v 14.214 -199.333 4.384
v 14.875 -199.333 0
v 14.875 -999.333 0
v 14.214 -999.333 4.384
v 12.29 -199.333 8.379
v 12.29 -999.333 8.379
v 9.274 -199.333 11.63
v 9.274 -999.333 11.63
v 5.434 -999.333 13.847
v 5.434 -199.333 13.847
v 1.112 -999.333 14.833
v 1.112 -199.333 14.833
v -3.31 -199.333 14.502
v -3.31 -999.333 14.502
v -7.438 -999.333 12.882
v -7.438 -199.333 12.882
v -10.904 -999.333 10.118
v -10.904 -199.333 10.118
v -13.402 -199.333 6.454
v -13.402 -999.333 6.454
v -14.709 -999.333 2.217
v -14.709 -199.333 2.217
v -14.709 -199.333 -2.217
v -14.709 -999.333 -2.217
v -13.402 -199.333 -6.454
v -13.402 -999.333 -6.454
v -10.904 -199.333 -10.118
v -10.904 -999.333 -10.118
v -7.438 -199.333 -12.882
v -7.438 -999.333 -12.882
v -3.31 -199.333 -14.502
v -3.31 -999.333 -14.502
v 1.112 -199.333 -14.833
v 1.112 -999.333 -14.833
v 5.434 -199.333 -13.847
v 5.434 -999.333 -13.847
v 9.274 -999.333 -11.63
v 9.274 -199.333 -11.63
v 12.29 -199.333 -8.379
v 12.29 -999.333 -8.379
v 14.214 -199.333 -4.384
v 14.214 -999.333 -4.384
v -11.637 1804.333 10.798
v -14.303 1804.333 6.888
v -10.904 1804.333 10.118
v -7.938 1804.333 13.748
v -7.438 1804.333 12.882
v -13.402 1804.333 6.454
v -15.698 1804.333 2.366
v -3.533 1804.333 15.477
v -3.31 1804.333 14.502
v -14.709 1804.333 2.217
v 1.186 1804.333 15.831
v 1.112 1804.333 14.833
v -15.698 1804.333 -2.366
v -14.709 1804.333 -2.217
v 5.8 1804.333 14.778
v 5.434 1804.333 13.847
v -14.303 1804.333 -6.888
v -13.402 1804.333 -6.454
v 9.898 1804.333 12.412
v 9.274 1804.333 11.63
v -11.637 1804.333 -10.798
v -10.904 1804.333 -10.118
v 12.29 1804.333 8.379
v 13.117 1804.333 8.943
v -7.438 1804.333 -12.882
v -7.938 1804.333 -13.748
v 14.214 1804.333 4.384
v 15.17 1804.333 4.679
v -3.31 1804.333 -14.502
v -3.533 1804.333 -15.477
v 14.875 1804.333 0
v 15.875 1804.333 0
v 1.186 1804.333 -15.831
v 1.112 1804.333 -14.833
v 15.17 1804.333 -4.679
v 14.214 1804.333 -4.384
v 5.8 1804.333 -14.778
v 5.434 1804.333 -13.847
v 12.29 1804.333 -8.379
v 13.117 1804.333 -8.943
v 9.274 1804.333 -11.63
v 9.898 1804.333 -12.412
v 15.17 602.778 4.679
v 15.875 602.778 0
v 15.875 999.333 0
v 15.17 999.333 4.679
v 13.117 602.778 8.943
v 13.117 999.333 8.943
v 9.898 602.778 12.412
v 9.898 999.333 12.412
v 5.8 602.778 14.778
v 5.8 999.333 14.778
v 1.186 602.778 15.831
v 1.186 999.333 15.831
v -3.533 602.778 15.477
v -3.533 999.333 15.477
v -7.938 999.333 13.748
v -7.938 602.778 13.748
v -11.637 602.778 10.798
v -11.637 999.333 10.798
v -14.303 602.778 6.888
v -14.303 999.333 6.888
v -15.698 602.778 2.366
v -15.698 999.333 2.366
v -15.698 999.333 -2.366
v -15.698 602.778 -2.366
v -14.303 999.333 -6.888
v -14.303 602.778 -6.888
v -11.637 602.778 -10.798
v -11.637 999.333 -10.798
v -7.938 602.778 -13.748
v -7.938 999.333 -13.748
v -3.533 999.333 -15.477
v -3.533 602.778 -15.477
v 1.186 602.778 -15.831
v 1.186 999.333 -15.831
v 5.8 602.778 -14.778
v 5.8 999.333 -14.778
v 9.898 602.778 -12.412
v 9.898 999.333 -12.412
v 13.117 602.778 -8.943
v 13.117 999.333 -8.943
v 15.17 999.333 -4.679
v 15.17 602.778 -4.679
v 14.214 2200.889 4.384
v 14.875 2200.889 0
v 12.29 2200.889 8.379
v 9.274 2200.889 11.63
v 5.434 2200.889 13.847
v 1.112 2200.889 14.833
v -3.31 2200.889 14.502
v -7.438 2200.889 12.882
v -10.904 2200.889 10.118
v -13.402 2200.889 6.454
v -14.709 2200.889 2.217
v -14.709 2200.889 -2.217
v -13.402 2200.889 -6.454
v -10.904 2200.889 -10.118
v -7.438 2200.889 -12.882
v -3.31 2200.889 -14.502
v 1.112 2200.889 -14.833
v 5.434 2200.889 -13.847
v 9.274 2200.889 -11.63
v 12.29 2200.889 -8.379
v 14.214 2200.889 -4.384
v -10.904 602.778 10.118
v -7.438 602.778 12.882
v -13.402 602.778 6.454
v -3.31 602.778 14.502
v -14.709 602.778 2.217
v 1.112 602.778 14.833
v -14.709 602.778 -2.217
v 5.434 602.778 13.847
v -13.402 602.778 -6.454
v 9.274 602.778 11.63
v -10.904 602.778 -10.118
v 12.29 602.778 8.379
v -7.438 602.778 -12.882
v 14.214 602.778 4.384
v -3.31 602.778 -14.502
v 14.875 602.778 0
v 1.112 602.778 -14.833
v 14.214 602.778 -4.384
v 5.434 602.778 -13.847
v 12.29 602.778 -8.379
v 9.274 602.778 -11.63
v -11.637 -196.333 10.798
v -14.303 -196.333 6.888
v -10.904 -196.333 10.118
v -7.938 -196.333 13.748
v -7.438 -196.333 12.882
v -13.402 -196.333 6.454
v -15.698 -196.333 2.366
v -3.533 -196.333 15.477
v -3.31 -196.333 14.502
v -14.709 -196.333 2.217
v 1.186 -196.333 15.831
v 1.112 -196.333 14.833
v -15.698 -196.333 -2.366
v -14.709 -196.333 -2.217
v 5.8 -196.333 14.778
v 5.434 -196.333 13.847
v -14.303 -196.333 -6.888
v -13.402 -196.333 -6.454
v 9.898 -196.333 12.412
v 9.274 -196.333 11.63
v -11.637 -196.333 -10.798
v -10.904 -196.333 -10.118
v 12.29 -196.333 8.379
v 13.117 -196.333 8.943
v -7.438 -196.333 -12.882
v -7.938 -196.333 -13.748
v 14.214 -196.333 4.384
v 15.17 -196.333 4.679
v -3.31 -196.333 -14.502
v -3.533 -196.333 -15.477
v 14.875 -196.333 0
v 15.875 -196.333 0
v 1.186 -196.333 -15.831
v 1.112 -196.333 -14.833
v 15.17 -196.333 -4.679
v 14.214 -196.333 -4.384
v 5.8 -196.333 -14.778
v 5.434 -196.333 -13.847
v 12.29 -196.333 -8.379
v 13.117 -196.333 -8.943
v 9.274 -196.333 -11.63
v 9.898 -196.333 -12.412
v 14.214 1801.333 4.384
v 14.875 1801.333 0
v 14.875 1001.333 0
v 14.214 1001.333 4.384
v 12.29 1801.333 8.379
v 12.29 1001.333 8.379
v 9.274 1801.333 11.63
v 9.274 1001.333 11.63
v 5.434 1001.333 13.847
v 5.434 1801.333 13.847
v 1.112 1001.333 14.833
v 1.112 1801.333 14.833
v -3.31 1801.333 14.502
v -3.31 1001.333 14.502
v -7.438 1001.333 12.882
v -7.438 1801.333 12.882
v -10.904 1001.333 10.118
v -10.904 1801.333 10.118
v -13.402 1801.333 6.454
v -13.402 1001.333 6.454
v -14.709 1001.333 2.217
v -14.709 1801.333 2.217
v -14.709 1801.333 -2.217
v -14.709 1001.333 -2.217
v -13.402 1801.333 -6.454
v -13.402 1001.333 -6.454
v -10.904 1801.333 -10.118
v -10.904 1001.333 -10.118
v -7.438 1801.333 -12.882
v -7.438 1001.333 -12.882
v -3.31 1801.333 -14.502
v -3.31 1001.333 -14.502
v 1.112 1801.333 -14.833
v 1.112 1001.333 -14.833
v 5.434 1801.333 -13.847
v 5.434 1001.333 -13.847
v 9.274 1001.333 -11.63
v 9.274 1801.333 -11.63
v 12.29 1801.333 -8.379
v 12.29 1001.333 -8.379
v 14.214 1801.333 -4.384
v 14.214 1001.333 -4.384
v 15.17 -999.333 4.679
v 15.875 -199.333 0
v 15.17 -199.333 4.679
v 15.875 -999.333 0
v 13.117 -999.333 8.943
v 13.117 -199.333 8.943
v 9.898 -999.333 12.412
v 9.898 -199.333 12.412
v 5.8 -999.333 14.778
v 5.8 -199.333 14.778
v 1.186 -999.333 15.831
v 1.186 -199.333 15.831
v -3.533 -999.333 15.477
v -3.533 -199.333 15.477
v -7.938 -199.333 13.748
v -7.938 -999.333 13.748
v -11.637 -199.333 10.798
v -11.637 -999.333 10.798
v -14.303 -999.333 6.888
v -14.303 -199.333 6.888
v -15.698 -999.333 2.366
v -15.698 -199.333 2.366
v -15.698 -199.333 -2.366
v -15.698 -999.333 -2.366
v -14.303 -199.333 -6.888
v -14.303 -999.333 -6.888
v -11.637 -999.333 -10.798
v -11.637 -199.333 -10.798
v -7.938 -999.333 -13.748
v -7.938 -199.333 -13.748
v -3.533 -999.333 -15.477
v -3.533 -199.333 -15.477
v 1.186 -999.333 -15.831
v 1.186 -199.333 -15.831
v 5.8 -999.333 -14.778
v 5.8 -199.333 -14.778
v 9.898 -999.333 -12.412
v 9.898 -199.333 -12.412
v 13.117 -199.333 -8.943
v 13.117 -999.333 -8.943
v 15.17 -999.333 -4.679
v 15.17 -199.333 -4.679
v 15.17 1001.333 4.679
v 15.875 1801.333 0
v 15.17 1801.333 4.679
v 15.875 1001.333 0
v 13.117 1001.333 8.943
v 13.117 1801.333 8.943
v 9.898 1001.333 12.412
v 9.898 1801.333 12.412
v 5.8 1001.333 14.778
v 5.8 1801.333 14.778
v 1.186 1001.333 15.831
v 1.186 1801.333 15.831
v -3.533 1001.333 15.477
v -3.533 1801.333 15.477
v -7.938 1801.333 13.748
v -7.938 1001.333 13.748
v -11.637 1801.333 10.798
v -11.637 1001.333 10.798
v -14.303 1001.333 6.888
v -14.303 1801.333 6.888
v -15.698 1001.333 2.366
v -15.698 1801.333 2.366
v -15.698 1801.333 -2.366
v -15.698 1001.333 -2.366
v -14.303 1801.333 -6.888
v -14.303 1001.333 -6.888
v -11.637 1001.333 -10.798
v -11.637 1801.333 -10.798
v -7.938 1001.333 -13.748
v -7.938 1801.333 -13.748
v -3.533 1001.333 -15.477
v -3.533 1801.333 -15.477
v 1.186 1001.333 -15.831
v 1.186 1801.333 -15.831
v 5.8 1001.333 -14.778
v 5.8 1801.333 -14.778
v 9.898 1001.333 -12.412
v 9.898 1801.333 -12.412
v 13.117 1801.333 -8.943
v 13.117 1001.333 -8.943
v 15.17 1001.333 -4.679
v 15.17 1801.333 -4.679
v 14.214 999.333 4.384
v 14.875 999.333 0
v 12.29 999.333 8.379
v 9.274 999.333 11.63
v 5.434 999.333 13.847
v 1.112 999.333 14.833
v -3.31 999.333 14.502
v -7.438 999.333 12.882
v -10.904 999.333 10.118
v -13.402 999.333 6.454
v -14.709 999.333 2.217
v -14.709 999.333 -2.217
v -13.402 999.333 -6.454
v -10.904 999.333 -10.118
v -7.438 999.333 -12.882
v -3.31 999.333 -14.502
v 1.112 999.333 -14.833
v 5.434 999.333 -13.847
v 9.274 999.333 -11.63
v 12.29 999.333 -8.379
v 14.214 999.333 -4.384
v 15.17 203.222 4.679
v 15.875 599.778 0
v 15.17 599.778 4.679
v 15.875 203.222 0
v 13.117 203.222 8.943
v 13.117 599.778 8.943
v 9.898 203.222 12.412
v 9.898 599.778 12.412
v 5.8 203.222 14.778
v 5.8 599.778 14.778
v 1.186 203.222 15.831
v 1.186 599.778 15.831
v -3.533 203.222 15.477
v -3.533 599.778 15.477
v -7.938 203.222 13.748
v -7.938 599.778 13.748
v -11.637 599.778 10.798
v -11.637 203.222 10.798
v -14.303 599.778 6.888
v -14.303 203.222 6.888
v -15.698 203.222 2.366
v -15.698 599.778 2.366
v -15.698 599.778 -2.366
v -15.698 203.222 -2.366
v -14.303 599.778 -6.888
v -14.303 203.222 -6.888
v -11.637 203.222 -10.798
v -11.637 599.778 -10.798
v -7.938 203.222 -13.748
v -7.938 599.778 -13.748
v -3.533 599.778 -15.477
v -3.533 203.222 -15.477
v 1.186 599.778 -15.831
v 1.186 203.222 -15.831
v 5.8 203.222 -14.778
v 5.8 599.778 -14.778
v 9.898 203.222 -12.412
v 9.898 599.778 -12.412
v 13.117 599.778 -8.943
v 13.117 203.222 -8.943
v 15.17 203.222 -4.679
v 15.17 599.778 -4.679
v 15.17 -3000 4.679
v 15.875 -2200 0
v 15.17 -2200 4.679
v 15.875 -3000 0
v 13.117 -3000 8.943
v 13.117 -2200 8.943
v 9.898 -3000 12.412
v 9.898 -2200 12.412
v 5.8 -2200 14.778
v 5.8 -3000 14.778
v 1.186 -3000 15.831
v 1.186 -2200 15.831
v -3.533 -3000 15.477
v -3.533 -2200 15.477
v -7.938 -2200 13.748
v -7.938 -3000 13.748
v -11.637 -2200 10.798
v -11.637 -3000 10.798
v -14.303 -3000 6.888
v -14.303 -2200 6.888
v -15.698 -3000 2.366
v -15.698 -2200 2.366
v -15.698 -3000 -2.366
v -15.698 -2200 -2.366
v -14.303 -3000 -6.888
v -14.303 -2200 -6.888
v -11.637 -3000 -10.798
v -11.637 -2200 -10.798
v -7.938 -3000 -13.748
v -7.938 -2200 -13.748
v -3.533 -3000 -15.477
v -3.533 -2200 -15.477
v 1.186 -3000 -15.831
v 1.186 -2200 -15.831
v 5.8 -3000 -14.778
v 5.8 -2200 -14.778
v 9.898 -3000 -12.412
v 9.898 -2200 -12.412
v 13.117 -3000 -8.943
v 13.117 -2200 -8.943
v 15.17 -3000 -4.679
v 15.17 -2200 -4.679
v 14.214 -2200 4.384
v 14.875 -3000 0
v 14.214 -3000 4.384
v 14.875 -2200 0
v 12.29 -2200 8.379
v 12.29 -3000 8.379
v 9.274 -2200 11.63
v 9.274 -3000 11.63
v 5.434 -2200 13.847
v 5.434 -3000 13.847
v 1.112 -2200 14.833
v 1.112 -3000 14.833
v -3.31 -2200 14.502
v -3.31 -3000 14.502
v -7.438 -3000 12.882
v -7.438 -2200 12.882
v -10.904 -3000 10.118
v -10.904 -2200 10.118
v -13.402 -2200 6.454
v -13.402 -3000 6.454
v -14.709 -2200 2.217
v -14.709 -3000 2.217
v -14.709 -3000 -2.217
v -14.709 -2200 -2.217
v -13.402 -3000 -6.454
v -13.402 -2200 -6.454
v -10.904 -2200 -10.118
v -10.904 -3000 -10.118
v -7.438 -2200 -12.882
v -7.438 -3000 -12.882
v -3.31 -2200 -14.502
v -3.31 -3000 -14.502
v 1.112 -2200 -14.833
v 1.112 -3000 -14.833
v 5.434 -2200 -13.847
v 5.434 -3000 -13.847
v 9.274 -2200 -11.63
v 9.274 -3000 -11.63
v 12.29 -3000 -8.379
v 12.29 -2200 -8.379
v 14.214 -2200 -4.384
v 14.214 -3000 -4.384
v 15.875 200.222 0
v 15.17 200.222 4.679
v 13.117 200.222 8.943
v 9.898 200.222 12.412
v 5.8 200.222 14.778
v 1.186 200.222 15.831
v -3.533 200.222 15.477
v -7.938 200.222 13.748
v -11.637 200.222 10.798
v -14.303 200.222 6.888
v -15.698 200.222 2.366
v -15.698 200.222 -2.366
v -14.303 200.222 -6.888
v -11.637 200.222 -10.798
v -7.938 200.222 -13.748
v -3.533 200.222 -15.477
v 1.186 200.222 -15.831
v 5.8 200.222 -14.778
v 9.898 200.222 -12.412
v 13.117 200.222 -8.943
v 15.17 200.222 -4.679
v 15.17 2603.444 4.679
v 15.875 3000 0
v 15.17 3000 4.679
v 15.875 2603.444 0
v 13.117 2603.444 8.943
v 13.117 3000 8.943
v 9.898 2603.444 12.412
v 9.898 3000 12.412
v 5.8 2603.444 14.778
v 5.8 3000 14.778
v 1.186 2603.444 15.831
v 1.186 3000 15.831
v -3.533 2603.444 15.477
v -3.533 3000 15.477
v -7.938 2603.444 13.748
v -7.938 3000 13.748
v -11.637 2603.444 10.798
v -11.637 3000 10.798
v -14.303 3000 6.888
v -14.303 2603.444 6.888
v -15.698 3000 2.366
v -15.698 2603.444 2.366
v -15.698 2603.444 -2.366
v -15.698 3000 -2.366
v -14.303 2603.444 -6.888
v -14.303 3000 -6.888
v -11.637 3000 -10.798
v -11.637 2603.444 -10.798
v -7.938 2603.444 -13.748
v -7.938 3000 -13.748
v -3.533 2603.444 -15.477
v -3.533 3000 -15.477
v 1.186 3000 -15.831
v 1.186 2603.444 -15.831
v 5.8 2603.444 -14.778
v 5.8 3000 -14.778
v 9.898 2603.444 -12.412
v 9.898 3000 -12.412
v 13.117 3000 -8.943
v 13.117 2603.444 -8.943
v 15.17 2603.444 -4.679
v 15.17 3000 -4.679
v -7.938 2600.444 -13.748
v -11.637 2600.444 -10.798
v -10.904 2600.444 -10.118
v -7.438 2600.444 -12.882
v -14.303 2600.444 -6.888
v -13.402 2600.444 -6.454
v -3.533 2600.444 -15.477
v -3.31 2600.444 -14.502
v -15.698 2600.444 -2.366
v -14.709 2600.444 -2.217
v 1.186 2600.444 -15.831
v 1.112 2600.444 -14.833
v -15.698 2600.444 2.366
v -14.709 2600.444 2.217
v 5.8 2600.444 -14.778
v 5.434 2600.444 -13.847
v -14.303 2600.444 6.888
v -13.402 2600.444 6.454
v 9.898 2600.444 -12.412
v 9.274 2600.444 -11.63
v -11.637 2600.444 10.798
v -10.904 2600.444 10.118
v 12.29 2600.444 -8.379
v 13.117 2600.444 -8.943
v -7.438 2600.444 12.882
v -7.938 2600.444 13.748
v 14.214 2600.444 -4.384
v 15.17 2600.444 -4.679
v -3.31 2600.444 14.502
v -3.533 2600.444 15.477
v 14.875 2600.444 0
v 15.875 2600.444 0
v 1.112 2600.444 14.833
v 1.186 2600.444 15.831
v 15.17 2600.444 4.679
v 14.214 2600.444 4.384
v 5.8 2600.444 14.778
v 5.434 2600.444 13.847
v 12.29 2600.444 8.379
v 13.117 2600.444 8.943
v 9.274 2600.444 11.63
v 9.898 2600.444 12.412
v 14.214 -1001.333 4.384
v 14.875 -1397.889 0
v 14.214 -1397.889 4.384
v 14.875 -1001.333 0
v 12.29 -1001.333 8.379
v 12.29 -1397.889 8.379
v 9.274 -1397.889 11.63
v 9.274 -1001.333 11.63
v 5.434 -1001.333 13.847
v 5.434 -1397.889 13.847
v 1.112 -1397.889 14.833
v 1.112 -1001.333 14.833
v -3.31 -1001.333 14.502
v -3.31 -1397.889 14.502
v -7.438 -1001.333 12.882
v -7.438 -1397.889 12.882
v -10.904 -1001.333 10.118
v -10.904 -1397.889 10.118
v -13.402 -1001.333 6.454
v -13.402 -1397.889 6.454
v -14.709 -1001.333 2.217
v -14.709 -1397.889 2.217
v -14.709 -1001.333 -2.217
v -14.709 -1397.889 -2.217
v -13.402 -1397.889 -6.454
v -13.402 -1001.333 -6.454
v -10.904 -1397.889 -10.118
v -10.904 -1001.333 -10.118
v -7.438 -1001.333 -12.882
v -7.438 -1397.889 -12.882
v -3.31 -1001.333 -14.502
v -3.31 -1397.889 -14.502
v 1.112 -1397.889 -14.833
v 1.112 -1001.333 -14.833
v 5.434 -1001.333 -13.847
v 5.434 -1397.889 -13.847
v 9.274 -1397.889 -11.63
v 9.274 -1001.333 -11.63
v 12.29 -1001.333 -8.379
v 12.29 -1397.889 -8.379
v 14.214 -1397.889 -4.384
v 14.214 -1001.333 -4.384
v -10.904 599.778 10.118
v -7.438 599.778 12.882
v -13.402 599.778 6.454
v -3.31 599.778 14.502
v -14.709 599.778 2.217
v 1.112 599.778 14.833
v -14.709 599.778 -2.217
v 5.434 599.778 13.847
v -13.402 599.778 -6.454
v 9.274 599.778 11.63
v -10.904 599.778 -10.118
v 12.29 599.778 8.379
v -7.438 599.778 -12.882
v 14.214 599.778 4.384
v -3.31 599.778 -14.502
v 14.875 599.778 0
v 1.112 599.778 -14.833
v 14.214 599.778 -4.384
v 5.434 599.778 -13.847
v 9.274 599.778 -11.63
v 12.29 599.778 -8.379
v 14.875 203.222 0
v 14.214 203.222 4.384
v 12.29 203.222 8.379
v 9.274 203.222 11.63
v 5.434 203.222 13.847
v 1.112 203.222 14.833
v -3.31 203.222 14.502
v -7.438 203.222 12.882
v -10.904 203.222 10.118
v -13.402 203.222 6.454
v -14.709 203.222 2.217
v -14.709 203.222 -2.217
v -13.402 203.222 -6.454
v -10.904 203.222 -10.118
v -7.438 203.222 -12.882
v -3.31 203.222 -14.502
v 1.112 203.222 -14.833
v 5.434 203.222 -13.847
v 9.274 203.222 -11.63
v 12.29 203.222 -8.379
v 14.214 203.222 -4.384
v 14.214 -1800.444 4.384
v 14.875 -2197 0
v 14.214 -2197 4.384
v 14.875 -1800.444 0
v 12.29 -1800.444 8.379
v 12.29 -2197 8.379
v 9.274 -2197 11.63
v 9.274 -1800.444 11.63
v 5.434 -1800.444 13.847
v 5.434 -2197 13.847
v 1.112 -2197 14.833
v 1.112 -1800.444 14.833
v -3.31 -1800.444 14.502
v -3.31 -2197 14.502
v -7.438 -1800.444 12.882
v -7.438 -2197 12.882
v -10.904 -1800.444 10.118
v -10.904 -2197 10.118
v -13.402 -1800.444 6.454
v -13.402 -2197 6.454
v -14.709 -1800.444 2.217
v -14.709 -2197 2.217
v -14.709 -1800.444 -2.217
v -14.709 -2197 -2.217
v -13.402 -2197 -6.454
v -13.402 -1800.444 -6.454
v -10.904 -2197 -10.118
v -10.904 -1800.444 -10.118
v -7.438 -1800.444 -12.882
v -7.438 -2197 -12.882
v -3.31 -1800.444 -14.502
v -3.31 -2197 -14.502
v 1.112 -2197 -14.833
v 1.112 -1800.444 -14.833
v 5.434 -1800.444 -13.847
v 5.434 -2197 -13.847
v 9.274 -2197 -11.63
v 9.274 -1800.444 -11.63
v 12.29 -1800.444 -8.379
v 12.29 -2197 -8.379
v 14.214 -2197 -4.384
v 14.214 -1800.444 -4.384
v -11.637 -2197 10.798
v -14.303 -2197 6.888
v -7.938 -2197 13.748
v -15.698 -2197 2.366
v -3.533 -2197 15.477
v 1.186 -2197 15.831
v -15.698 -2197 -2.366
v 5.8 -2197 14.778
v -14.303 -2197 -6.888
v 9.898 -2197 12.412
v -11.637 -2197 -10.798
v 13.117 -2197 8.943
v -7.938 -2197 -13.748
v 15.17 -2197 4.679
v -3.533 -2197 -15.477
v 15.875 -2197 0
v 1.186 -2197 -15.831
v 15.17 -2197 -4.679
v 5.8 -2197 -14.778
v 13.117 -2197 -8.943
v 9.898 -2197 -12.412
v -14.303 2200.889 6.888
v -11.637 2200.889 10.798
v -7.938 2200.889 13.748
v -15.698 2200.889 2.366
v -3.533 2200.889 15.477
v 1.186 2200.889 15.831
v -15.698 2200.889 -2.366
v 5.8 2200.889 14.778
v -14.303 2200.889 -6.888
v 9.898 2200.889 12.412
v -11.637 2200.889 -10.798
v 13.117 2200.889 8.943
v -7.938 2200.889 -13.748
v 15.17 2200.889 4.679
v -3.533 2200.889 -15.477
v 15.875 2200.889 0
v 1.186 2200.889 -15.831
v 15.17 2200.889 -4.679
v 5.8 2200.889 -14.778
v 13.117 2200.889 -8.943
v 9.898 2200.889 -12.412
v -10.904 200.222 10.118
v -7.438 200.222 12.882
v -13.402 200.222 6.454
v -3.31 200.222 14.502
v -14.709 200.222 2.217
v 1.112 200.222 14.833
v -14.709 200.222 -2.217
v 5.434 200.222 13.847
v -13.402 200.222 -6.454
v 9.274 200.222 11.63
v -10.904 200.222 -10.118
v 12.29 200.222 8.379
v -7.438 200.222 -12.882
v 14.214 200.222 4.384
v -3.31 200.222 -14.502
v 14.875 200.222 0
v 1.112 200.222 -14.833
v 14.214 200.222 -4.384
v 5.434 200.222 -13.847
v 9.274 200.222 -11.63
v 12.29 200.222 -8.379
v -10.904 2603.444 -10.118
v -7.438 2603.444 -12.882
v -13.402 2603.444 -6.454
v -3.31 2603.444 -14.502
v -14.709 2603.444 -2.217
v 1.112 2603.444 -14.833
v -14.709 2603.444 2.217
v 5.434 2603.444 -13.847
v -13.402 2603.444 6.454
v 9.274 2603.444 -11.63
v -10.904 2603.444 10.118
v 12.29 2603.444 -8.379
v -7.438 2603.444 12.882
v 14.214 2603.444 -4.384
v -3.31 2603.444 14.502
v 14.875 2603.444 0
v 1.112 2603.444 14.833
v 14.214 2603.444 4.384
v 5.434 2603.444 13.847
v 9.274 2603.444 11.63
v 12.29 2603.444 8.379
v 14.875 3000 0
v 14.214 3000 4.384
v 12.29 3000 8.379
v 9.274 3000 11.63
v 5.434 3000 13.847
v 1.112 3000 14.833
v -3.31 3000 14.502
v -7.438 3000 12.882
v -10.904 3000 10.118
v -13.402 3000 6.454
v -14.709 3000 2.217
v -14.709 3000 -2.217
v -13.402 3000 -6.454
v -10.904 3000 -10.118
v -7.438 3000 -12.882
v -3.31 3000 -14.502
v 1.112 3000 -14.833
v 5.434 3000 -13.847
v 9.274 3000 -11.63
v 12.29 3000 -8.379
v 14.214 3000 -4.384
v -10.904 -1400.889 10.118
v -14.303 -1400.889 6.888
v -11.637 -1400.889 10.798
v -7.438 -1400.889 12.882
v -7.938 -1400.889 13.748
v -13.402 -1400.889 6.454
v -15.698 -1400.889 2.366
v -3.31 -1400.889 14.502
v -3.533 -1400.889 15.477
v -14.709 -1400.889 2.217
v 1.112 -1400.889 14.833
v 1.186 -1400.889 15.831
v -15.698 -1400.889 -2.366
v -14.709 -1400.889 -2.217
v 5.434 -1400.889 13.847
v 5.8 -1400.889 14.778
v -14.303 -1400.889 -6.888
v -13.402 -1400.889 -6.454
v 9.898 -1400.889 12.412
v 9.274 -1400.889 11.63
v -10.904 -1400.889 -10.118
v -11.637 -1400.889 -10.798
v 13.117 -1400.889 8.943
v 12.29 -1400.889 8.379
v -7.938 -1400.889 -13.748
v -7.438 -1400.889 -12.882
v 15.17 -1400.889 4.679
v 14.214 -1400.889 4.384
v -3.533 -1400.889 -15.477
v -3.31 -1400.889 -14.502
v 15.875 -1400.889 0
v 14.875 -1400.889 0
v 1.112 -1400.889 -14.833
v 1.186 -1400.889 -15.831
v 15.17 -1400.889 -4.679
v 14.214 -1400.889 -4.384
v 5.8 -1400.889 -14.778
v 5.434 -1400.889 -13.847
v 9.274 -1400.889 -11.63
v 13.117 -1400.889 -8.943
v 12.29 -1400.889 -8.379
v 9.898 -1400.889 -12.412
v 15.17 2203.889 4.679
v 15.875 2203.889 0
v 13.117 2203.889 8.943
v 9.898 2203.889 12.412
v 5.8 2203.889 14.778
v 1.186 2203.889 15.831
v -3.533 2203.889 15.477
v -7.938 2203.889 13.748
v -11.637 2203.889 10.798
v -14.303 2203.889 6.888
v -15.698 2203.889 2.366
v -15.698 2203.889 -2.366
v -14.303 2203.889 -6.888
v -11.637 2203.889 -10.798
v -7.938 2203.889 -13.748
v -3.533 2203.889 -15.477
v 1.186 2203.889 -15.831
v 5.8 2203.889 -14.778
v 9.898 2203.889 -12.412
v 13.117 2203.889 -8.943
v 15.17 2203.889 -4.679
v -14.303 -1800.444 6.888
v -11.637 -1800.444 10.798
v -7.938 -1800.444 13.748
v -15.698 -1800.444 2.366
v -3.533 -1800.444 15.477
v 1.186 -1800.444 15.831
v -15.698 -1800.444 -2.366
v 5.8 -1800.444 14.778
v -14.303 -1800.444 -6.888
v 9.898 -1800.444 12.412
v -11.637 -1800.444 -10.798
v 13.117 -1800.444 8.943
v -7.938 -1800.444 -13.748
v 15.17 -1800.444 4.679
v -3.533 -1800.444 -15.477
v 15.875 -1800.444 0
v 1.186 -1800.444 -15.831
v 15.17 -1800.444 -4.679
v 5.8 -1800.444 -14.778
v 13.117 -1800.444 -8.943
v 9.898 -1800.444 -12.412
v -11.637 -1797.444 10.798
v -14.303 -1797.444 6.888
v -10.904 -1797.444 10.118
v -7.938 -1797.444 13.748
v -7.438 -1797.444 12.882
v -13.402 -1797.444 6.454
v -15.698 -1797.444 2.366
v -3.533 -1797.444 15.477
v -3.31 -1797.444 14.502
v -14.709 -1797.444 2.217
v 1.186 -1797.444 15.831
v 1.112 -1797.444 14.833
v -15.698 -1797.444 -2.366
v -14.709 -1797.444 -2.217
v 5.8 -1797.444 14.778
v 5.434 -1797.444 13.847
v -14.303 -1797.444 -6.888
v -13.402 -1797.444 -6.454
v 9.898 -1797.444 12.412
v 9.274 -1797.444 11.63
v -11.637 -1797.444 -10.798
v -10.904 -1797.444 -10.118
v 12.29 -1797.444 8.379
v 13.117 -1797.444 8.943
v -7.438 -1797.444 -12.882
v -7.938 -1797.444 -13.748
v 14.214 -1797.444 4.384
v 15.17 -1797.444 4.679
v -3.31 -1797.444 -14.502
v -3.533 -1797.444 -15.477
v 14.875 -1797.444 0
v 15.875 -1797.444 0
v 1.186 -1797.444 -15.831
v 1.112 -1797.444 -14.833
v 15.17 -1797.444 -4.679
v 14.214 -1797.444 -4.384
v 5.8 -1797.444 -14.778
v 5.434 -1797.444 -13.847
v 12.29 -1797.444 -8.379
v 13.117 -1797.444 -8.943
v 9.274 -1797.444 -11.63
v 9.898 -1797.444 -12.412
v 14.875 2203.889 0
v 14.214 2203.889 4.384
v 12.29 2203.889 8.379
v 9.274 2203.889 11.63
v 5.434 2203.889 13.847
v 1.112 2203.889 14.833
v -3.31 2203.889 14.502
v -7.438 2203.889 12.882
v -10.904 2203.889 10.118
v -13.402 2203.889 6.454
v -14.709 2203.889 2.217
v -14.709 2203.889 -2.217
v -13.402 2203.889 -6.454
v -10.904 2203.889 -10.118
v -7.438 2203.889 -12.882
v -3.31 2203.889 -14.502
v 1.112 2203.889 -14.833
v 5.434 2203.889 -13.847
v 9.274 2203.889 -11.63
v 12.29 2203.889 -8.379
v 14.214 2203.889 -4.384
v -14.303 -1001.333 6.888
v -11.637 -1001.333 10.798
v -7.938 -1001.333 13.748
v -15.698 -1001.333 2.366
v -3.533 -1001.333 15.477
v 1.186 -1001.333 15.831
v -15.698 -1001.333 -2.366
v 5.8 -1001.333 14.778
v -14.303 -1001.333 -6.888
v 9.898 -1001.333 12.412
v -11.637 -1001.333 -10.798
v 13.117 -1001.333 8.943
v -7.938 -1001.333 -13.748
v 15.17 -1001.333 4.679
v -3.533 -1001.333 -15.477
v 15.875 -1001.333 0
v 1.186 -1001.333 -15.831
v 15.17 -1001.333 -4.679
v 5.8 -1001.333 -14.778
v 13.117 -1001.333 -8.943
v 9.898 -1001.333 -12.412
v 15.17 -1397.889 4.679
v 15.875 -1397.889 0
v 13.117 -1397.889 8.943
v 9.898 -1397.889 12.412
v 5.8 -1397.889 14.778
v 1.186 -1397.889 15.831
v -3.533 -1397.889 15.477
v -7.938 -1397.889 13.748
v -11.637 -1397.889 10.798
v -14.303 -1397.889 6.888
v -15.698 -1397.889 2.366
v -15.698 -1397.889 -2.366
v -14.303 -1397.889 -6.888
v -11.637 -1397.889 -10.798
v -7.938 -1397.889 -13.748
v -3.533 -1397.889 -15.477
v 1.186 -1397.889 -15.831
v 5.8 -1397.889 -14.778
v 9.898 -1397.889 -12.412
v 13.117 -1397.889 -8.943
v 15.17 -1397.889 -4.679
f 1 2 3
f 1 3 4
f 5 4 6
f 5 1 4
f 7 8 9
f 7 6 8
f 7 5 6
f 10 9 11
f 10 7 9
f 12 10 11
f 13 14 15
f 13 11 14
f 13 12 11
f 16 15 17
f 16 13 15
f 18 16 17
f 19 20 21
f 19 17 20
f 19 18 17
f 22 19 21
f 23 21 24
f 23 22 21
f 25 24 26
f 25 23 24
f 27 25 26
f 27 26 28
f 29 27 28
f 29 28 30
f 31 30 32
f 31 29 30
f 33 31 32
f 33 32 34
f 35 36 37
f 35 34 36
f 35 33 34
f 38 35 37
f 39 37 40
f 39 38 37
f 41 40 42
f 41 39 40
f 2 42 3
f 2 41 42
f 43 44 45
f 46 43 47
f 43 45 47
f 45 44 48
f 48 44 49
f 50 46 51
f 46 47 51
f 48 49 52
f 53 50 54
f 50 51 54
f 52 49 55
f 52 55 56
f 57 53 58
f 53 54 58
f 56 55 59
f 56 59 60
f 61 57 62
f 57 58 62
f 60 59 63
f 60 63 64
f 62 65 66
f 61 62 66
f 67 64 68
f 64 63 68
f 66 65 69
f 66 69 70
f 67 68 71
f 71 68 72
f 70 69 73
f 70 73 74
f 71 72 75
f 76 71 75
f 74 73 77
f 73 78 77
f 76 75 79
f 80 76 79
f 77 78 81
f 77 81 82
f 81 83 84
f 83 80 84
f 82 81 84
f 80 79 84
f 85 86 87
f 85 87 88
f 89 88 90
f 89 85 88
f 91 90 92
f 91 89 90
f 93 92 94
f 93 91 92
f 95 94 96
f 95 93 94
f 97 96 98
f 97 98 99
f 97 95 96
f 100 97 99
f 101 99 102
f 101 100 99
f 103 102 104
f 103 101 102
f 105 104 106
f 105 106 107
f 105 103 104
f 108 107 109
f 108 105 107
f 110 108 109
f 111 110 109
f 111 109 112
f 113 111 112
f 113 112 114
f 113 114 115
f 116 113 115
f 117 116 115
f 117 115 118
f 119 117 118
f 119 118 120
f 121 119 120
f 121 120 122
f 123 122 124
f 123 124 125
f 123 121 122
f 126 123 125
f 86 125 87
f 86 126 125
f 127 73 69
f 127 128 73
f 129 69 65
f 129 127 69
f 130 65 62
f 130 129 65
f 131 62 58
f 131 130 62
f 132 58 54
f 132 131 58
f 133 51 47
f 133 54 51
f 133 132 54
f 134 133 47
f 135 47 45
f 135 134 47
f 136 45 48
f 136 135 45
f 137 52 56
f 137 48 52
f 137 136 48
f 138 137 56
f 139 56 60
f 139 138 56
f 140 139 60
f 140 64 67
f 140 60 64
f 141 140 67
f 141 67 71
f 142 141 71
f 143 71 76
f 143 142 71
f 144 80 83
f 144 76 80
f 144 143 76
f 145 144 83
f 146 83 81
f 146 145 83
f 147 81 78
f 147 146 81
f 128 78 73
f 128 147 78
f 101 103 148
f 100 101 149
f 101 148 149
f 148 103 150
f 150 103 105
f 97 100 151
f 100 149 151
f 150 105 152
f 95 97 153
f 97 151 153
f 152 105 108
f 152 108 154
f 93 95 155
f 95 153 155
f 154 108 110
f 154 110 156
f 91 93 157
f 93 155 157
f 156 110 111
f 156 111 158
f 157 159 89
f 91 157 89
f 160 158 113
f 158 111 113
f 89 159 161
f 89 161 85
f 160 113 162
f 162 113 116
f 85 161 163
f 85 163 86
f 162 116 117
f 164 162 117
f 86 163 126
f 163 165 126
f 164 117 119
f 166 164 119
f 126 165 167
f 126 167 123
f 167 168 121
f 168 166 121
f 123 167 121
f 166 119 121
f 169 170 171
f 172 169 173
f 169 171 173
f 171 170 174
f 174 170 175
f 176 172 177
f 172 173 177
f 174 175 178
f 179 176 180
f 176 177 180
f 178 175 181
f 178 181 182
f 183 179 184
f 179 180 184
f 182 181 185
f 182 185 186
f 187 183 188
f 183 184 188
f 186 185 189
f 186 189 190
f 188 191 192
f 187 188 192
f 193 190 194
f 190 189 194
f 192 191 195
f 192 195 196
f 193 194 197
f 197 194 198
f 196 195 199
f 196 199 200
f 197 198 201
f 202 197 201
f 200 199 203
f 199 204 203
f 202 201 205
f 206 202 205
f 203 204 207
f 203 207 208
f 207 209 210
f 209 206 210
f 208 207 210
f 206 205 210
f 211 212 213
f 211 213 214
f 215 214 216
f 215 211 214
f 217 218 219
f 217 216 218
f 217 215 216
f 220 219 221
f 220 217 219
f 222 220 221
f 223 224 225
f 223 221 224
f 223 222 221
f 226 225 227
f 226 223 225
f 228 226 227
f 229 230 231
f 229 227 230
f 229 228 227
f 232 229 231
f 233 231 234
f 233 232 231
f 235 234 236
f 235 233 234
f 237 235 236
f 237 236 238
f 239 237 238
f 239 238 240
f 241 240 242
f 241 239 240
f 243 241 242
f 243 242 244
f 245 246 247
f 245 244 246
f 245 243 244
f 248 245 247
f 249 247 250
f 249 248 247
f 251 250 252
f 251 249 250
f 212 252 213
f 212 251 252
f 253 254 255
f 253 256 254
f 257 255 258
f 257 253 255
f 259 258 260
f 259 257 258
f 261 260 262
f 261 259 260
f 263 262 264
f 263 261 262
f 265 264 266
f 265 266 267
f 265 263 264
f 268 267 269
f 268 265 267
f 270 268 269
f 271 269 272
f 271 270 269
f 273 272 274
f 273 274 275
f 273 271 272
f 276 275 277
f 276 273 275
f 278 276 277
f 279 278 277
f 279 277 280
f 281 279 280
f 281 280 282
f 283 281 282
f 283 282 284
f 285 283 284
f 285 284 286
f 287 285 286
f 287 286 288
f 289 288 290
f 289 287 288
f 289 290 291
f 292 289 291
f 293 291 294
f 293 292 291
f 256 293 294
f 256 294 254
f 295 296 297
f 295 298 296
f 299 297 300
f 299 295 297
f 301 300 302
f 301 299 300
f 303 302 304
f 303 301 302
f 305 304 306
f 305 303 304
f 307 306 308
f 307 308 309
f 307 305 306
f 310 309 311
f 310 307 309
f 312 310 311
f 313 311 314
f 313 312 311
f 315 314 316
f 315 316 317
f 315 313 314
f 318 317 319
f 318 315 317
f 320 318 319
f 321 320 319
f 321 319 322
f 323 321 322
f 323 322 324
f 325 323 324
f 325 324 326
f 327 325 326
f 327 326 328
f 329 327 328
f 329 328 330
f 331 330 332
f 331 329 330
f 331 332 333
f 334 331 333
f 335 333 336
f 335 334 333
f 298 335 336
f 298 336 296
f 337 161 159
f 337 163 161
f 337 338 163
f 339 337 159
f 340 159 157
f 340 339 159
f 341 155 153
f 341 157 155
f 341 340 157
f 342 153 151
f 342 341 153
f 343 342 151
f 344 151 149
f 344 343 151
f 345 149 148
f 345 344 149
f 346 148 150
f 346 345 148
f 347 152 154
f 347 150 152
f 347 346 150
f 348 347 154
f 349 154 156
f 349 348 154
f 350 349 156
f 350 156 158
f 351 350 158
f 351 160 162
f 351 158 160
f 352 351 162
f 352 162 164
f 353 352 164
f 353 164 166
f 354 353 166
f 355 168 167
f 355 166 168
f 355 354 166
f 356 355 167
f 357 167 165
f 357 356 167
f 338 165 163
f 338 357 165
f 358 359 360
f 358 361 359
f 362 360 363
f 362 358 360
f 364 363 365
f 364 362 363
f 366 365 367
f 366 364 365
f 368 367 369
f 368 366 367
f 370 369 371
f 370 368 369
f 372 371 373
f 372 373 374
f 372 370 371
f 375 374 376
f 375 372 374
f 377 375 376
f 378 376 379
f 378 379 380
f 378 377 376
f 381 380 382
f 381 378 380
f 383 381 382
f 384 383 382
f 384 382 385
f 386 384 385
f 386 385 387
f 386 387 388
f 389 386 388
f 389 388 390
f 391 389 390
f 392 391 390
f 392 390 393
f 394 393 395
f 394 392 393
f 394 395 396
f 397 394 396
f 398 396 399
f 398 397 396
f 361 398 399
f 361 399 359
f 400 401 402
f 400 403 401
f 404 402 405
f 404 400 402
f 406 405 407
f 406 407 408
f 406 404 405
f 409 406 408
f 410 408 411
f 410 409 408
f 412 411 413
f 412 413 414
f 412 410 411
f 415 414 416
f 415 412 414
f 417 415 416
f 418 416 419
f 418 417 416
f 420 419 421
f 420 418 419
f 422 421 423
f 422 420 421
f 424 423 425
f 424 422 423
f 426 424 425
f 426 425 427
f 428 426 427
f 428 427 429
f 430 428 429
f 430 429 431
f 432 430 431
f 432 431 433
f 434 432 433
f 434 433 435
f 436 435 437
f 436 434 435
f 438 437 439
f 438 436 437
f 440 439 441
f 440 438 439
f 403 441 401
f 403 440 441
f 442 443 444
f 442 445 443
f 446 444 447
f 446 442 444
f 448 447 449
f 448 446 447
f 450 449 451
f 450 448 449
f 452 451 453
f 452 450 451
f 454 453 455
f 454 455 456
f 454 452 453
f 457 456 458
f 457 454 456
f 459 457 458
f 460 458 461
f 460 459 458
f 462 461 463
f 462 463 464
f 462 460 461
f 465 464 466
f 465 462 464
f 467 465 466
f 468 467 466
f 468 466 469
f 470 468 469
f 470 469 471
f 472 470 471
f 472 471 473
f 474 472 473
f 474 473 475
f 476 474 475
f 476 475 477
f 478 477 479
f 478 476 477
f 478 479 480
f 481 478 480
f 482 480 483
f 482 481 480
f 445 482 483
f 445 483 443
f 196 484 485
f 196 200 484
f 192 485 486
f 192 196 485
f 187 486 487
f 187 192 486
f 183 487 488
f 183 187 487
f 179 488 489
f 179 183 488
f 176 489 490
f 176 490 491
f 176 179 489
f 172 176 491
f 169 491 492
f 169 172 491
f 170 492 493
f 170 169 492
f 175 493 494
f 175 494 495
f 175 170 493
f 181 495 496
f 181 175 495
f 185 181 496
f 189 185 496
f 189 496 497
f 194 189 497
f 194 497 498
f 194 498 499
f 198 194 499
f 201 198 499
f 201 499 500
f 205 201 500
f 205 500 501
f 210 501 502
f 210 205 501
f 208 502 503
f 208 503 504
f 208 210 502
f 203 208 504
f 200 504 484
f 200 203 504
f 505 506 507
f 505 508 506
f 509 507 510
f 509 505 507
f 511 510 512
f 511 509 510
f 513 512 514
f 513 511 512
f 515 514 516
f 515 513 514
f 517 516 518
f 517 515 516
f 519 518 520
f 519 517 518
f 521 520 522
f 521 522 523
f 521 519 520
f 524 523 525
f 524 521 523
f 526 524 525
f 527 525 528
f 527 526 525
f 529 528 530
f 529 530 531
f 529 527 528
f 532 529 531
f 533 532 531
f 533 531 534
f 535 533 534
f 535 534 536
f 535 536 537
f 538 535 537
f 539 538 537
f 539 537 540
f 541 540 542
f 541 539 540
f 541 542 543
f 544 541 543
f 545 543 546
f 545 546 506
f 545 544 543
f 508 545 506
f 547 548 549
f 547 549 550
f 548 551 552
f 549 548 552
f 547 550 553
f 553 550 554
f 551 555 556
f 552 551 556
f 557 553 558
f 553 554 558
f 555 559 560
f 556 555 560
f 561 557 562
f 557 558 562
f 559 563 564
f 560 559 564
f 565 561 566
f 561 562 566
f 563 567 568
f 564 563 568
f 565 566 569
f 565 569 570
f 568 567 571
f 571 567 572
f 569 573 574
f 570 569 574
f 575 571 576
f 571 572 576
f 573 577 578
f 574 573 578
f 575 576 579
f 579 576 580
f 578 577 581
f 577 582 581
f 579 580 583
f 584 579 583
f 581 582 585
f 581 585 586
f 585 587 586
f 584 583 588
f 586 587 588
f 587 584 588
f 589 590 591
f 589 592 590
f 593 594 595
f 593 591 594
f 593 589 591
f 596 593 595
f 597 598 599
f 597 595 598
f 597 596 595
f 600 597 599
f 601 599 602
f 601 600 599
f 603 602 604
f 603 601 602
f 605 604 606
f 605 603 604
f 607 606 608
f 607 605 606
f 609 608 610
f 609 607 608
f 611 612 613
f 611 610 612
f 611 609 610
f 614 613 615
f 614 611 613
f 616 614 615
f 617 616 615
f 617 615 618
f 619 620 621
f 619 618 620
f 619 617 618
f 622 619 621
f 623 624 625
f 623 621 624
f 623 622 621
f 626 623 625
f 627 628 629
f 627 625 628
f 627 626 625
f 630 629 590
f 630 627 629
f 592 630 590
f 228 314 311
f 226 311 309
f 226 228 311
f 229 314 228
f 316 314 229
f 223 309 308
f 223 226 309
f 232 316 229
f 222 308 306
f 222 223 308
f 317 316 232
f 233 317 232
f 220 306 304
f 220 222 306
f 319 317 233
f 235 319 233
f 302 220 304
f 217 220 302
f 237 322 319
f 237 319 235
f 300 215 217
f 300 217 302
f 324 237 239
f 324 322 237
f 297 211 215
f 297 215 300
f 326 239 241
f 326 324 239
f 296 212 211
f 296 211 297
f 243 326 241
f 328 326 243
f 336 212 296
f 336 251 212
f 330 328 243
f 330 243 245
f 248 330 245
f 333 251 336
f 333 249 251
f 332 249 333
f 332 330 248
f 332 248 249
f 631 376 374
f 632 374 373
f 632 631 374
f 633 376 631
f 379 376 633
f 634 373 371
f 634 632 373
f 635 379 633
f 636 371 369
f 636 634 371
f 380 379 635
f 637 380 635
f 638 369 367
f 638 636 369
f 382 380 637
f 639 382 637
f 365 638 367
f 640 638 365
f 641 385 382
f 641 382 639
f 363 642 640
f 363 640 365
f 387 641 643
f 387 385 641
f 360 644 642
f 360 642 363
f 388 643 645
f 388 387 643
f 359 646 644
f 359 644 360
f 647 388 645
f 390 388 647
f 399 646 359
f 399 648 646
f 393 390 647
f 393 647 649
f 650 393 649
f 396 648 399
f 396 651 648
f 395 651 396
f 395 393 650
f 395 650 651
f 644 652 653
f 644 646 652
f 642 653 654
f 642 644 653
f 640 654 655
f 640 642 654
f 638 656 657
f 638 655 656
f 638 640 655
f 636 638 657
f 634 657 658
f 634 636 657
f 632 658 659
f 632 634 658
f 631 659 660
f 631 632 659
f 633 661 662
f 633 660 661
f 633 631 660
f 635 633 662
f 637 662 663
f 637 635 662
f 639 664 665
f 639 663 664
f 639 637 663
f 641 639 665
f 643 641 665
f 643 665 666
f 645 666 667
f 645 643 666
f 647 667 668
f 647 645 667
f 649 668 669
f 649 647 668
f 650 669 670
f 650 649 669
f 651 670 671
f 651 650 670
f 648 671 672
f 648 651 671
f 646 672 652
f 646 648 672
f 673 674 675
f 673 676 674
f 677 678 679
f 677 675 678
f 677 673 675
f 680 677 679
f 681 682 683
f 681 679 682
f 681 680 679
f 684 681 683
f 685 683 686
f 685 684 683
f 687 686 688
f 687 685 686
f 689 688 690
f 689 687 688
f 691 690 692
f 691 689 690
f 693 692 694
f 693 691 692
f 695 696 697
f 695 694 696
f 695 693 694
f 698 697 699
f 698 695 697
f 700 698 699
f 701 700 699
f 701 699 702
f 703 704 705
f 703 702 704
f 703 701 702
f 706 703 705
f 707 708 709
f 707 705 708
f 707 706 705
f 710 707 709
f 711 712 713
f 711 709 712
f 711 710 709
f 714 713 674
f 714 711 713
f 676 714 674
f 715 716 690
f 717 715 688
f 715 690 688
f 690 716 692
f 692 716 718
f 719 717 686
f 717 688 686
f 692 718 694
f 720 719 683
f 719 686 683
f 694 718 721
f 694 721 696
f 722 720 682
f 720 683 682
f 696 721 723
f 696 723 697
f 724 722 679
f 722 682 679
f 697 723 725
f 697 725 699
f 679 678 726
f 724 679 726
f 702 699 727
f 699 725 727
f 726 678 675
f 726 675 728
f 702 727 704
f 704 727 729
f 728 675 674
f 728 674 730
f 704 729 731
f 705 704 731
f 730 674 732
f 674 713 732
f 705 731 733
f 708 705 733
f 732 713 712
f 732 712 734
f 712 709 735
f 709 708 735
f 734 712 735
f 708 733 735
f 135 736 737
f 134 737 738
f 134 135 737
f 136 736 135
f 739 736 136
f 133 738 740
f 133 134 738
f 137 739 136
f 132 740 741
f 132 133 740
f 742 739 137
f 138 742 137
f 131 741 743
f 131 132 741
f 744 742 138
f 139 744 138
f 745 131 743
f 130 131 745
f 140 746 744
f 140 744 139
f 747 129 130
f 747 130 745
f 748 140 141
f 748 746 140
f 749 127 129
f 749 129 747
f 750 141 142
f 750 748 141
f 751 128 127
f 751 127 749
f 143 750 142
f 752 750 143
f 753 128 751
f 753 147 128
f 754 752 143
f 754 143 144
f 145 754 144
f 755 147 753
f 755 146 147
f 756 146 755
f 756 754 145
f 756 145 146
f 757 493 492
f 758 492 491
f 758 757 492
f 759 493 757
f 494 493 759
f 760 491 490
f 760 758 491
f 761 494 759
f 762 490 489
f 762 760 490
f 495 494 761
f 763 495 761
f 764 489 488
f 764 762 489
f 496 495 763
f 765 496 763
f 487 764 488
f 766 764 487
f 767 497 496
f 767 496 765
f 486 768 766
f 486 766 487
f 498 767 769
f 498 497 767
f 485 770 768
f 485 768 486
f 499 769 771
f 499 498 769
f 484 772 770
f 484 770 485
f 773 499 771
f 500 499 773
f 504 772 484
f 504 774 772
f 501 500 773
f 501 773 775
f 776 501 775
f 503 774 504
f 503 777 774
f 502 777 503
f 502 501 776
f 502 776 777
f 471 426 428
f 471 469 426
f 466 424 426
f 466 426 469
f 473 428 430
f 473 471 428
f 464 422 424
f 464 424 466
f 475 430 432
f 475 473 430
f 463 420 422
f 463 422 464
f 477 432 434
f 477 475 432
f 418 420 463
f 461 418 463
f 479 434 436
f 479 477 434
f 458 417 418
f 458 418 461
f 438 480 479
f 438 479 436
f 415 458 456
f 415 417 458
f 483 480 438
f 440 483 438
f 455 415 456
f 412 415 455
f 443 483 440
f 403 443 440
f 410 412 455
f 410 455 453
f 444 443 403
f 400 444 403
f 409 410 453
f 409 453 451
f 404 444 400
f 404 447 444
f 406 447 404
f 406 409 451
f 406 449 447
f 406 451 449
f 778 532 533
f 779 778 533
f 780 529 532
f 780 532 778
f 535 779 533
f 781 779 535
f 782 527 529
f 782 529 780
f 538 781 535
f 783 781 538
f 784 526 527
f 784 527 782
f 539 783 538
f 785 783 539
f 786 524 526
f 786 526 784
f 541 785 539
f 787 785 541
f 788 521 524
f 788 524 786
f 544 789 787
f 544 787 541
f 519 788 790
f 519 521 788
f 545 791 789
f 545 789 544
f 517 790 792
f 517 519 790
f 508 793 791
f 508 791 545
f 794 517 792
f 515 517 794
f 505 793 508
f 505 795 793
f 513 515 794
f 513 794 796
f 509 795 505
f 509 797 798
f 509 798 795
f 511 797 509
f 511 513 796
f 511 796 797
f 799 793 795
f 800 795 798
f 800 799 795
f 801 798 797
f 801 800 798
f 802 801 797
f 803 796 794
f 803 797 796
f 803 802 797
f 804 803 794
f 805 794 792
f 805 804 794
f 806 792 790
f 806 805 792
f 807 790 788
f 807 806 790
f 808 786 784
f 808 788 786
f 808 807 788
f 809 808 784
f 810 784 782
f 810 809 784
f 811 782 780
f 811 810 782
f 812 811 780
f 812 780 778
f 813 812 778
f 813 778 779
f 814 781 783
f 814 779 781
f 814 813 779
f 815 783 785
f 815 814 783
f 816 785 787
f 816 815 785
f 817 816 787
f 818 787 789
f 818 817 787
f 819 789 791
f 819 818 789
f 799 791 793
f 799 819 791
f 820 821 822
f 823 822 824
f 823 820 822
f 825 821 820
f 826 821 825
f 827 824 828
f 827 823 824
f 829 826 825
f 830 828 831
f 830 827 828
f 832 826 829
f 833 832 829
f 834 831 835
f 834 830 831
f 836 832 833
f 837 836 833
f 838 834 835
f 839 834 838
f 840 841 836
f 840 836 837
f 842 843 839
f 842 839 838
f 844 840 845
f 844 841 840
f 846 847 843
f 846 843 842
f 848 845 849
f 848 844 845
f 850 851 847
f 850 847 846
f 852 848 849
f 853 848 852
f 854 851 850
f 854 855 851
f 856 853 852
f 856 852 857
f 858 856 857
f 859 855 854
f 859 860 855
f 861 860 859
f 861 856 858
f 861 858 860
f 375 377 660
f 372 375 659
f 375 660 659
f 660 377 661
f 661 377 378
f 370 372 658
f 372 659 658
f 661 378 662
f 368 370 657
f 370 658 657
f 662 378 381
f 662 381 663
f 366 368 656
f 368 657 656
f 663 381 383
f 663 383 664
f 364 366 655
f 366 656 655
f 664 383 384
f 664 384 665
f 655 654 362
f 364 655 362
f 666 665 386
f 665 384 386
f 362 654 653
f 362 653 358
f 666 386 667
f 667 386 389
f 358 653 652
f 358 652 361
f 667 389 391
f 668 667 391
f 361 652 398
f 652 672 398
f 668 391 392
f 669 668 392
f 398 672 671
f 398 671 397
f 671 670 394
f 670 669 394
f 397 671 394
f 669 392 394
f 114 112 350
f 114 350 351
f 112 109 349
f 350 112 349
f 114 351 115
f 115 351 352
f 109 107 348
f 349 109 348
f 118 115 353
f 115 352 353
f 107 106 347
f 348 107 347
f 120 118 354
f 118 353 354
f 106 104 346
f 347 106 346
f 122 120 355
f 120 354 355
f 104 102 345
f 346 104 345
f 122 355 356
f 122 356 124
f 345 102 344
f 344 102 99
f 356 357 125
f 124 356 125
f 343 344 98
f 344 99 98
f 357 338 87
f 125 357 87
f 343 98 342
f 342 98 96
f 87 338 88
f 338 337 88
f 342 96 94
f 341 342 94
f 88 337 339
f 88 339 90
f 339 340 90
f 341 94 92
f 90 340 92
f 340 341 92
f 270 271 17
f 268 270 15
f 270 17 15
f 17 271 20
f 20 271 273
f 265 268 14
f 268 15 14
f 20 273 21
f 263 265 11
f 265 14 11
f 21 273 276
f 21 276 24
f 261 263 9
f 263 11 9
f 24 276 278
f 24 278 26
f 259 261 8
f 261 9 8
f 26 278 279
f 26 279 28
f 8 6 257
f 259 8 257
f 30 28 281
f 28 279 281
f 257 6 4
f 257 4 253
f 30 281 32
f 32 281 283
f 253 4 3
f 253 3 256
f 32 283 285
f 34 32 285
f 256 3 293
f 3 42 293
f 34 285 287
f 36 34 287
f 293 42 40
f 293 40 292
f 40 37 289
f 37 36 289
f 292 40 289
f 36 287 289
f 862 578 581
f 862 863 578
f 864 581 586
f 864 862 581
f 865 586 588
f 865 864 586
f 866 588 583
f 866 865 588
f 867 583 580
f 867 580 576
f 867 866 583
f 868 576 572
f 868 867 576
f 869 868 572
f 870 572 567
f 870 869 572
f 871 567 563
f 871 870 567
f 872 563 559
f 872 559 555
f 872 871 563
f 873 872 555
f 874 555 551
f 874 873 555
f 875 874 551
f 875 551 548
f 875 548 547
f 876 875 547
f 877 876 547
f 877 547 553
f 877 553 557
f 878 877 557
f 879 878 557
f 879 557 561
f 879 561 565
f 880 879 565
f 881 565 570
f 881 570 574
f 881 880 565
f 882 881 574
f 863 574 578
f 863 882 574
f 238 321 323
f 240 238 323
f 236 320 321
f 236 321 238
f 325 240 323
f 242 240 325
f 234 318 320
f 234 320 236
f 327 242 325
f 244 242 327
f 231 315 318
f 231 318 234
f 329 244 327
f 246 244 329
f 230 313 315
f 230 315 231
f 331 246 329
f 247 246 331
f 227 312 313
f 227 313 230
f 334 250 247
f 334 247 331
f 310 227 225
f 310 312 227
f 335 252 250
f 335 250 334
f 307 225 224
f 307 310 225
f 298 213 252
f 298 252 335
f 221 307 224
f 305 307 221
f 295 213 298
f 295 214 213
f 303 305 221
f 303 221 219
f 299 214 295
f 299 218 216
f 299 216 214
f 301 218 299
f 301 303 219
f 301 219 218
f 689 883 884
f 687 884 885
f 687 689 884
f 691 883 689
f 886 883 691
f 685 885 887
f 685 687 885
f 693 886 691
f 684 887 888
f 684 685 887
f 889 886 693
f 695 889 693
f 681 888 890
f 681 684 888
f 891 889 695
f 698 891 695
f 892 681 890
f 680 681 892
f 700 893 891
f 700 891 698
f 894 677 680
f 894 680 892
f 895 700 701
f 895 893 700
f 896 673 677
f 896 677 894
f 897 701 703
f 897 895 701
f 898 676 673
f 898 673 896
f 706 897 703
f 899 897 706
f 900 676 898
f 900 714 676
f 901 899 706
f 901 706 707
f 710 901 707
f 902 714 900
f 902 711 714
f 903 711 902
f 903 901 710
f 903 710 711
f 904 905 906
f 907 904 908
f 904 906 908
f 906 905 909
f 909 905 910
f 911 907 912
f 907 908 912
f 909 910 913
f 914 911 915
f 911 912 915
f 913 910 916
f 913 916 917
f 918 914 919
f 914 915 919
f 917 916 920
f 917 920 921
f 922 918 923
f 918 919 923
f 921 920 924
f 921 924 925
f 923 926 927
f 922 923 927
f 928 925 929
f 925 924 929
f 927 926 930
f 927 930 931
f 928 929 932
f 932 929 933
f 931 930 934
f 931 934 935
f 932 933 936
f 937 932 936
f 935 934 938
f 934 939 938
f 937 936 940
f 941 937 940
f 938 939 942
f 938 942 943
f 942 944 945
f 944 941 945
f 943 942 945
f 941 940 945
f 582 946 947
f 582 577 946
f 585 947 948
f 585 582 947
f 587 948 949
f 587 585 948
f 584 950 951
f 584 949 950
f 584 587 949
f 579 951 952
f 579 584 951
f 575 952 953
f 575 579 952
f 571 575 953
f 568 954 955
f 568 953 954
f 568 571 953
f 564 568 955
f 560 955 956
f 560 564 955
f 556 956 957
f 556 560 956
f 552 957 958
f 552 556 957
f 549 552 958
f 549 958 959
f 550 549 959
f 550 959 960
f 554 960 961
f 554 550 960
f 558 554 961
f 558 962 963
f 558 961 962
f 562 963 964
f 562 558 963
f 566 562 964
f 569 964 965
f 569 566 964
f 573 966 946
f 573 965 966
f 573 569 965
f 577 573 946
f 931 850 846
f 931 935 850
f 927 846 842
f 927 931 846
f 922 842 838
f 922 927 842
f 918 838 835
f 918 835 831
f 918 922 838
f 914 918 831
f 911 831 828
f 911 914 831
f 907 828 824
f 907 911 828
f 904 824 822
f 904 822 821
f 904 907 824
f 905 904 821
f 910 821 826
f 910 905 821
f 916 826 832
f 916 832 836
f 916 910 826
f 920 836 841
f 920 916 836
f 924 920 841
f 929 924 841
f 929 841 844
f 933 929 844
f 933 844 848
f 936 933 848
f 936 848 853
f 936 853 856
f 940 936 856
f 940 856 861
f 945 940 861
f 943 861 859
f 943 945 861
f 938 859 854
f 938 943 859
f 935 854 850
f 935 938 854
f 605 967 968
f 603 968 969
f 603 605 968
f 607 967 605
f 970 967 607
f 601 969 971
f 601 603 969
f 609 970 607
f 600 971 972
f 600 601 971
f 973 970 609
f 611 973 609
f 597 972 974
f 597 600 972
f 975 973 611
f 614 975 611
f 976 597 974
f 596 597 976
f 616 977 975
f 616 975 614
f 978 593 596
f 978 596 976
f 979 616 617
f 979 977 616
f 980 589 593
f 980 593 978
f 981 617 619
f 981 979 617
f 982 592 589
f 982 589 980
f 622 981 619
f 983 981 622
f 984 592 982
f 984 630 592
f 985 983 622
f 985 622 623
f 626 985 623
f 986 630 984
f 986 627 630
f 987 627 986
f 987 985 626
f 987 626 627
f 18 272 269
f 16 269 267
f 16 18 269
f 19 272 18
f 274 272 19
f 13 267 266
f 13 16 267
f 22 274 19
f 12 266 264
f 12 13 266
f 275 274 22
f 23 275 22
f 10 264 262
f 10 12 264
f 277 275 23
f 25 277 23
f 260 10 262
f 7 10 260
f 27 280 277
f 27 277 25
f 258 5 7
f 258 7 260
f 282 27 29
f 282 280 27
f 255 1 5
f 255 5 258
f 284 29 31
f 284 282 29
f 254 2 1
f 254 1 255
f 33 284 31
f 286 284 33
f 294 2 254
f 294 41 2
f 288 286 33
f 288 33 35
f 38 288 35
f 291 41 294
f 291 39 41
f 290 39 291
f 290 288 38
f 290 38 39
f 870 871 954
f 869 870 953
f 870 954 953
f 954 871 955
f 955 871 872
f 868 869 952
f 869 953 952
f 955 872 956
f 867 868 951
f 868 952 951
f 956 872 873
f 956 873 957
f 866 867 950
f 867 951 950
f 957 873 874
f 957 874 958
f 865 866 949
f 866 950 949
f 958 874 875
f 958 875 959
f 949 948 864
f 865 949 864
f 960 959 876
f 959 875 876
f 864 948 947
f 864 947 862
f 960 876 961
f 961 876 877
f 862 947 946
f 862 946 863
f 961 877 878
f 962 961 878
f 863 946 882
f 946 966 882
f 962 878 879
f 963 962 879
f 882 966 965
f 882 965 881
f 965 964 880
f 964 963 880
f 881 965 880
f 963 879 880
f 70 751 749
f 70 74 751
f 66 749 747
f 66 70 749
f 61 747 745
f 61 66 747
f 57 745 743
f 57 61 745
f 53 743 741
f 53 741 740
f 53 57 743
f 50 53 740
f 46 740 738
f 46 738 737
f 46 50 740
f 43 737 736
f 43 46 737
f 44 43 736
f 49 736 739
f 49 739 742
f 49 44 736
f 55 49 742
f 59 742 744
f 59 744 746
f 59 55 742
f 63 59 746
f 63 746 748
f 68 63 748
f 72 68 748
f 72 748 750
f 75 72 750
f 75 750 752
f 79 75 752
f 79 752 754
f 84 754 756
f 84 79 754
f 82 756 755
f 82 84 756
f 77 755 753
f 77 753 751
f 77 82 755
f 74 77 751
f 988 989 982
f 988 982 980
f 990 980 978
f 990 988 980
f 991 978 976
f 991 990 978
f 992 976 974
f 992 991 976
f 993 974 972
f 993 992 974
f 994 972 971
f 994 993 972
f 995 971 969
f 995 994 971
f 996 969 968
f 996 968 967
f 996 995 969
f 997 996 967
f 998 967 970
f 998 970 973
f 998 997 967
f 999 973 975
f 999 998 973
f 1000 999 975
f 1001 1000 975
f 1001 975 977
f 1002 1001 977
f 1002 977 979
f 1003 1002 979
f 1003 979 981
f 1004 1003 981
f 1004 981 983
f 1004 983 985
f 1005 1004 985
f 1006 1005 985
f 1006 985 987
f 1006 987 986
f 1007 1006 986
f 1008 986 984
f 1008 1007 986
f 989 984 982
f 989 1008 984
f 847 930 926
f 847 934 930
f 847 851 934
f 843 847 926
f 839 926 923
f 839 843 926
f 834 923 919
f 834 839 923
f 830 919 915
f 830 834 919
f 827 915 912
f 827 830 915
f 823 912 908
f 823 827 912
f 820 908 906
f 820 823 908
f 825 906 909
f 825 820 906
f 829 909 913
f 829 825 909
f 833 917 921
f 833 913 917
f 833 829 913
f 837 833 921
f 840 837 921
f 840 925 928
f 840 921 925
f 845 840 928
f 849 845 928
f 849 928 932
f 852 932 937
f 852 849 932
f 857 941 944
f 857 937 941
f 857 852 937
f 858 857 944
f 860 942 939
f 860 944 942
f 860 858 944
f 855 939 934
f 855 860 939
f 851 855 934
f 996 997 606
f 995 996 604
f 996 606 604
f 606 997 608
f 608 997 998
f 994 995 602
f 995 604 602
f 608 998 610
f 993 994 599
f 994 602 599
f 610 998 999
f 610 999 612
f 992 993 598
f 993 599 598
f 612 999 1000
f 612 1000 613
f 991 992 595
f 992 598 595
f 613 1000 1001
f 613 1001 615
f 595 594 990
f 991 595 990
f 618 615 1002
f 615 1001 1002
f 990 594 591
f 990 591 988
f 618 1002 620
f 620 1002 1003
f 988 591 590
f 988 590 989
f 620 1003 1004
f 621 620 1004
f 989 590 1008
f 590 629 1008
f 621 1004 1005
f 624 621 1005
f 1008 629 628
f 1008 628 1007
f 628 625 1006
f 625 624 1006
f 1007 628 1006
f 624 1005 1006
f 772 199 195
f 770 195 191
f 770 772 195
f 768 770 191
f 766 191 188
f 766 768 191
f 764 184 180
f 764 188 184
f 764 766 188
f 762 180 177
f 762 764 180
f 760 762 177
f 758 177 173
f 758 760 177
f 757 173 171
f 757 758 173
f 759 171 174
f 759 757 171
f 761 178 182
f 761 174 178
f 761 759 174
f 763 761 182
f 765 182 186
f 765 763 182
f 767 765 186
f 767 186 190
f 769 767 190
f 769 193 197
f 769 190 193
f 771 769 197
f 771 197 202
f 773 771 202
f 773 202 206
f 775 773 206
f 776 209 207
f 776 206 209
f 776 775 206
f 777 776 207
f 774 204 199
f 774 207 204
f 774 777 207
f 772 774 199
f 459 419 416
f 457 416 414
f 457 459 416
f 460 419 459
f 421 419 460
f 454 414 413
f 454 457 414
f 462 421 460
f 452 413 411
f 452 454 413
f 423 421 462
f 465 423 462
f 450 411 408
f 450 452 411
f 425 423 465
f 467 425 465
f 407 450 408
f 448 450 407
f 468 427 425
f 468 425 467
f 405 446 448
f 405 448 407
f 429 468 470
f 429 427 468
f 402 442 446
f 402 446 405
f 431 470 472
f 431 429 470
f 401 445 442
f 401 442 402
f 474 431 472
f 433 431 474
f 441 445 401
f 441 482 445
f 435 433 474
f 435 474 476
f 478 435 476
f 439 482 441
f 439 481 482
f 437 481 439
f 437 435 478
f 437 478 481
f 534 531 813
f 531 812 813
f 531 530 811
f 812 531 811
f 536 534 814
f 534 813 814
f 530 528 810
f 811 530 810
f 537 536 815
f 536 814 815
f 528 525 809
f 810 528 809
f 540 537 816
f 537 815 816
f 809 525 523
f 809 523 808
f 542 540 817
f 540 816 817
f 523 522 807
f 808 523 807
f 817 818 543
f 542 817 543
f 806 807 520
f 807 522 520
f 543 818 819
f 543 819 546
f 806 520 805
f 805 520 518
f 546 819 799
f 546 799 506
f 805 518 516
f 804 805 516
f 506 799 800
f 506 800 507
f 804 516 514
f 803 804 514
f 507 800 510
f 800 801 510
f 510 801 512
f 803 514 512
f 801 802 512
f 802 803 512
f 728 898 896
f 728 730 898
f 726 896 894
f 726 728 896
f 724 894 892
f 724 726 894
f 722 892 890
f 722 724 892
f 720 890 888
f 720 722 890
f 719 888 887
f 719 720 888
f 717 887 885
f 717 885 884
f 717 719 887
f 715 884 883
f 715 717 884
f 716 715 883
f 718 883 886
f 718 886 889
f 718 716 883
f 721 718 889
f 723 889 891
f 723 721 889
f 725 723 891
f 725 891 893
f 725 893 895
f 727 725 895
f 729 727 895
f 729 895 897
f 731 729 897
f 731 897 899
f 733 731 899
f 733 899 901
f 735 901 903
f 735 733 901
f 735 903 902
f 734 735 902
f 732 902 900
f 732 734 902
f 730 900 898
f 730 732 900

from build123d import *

# Parameters (mm, degrees)
F0_R     = 15.875
F0_R_2   = 14.875
F1_DEPTH = 3000
F2_W     = 31.75
F2_H     = 2
F3_DEPTH = 16
F4_W     = 31.75
F4_H     = 3
F5_DEPTH = 17.5


with BuildPart() as f1:
    # F0 (on Front) → F1 (new body, symmetric)
    with BuildSketch(Plane.XZ):
        Circle(F0_R)
        Circle(F0_R_2, mode=Mode.SUBTRACT)
    extrude(amount=F1_DEPTH, both=True)

    # F2 (on Top) → F3 (cut, symmetric)
    with BuildSketch(Plane.XY):
        with Locations((0, -1000.333333)):
            Rectangle(F2_W, F2_H)
        with Locations((0, 1000.333333)):
            Rectangle(F2_W, F2_H)
    extrude(amount=F3_DEPTH, both=True, mode=Mode.SUBTRACT)

    # F4 (on Top) → F5 (cut, symmetric)
    with BuildSketch(Plane.XY):
        with Locations((0, -2198.5)):
            Rectangle(F4_W, F4_H)
        with Locations((0, -1798.944444)):
            Rectangle(F4_W, F4_H)
        with Locations((0, -1399.388889)):
            Rectangle(F4_W, F4_H)
        with Locations((0, -197.833333)):
            Rectangle(F4_W, F4_H)
        with Locations((0, 201.722222)):
            Rectangle(F4_W, F4_H)
        with Locations((0, 601.277778)):
            Rectangle(F4_W, F4_H)
        with Locations((0, 1802.833333)):
            Rectangle(F4_W, F4_H)
        with Locations((0, 2202.388889)):
            Rectangle(F4_W, F4_H)
        with Locations((0, 2601.944444)):
            Rectangle(F4_W, F4_H)
    extrude(amount=F5_DEPTH, both=True, mode=Mode.SUBTRACT)


solid = f1.part
